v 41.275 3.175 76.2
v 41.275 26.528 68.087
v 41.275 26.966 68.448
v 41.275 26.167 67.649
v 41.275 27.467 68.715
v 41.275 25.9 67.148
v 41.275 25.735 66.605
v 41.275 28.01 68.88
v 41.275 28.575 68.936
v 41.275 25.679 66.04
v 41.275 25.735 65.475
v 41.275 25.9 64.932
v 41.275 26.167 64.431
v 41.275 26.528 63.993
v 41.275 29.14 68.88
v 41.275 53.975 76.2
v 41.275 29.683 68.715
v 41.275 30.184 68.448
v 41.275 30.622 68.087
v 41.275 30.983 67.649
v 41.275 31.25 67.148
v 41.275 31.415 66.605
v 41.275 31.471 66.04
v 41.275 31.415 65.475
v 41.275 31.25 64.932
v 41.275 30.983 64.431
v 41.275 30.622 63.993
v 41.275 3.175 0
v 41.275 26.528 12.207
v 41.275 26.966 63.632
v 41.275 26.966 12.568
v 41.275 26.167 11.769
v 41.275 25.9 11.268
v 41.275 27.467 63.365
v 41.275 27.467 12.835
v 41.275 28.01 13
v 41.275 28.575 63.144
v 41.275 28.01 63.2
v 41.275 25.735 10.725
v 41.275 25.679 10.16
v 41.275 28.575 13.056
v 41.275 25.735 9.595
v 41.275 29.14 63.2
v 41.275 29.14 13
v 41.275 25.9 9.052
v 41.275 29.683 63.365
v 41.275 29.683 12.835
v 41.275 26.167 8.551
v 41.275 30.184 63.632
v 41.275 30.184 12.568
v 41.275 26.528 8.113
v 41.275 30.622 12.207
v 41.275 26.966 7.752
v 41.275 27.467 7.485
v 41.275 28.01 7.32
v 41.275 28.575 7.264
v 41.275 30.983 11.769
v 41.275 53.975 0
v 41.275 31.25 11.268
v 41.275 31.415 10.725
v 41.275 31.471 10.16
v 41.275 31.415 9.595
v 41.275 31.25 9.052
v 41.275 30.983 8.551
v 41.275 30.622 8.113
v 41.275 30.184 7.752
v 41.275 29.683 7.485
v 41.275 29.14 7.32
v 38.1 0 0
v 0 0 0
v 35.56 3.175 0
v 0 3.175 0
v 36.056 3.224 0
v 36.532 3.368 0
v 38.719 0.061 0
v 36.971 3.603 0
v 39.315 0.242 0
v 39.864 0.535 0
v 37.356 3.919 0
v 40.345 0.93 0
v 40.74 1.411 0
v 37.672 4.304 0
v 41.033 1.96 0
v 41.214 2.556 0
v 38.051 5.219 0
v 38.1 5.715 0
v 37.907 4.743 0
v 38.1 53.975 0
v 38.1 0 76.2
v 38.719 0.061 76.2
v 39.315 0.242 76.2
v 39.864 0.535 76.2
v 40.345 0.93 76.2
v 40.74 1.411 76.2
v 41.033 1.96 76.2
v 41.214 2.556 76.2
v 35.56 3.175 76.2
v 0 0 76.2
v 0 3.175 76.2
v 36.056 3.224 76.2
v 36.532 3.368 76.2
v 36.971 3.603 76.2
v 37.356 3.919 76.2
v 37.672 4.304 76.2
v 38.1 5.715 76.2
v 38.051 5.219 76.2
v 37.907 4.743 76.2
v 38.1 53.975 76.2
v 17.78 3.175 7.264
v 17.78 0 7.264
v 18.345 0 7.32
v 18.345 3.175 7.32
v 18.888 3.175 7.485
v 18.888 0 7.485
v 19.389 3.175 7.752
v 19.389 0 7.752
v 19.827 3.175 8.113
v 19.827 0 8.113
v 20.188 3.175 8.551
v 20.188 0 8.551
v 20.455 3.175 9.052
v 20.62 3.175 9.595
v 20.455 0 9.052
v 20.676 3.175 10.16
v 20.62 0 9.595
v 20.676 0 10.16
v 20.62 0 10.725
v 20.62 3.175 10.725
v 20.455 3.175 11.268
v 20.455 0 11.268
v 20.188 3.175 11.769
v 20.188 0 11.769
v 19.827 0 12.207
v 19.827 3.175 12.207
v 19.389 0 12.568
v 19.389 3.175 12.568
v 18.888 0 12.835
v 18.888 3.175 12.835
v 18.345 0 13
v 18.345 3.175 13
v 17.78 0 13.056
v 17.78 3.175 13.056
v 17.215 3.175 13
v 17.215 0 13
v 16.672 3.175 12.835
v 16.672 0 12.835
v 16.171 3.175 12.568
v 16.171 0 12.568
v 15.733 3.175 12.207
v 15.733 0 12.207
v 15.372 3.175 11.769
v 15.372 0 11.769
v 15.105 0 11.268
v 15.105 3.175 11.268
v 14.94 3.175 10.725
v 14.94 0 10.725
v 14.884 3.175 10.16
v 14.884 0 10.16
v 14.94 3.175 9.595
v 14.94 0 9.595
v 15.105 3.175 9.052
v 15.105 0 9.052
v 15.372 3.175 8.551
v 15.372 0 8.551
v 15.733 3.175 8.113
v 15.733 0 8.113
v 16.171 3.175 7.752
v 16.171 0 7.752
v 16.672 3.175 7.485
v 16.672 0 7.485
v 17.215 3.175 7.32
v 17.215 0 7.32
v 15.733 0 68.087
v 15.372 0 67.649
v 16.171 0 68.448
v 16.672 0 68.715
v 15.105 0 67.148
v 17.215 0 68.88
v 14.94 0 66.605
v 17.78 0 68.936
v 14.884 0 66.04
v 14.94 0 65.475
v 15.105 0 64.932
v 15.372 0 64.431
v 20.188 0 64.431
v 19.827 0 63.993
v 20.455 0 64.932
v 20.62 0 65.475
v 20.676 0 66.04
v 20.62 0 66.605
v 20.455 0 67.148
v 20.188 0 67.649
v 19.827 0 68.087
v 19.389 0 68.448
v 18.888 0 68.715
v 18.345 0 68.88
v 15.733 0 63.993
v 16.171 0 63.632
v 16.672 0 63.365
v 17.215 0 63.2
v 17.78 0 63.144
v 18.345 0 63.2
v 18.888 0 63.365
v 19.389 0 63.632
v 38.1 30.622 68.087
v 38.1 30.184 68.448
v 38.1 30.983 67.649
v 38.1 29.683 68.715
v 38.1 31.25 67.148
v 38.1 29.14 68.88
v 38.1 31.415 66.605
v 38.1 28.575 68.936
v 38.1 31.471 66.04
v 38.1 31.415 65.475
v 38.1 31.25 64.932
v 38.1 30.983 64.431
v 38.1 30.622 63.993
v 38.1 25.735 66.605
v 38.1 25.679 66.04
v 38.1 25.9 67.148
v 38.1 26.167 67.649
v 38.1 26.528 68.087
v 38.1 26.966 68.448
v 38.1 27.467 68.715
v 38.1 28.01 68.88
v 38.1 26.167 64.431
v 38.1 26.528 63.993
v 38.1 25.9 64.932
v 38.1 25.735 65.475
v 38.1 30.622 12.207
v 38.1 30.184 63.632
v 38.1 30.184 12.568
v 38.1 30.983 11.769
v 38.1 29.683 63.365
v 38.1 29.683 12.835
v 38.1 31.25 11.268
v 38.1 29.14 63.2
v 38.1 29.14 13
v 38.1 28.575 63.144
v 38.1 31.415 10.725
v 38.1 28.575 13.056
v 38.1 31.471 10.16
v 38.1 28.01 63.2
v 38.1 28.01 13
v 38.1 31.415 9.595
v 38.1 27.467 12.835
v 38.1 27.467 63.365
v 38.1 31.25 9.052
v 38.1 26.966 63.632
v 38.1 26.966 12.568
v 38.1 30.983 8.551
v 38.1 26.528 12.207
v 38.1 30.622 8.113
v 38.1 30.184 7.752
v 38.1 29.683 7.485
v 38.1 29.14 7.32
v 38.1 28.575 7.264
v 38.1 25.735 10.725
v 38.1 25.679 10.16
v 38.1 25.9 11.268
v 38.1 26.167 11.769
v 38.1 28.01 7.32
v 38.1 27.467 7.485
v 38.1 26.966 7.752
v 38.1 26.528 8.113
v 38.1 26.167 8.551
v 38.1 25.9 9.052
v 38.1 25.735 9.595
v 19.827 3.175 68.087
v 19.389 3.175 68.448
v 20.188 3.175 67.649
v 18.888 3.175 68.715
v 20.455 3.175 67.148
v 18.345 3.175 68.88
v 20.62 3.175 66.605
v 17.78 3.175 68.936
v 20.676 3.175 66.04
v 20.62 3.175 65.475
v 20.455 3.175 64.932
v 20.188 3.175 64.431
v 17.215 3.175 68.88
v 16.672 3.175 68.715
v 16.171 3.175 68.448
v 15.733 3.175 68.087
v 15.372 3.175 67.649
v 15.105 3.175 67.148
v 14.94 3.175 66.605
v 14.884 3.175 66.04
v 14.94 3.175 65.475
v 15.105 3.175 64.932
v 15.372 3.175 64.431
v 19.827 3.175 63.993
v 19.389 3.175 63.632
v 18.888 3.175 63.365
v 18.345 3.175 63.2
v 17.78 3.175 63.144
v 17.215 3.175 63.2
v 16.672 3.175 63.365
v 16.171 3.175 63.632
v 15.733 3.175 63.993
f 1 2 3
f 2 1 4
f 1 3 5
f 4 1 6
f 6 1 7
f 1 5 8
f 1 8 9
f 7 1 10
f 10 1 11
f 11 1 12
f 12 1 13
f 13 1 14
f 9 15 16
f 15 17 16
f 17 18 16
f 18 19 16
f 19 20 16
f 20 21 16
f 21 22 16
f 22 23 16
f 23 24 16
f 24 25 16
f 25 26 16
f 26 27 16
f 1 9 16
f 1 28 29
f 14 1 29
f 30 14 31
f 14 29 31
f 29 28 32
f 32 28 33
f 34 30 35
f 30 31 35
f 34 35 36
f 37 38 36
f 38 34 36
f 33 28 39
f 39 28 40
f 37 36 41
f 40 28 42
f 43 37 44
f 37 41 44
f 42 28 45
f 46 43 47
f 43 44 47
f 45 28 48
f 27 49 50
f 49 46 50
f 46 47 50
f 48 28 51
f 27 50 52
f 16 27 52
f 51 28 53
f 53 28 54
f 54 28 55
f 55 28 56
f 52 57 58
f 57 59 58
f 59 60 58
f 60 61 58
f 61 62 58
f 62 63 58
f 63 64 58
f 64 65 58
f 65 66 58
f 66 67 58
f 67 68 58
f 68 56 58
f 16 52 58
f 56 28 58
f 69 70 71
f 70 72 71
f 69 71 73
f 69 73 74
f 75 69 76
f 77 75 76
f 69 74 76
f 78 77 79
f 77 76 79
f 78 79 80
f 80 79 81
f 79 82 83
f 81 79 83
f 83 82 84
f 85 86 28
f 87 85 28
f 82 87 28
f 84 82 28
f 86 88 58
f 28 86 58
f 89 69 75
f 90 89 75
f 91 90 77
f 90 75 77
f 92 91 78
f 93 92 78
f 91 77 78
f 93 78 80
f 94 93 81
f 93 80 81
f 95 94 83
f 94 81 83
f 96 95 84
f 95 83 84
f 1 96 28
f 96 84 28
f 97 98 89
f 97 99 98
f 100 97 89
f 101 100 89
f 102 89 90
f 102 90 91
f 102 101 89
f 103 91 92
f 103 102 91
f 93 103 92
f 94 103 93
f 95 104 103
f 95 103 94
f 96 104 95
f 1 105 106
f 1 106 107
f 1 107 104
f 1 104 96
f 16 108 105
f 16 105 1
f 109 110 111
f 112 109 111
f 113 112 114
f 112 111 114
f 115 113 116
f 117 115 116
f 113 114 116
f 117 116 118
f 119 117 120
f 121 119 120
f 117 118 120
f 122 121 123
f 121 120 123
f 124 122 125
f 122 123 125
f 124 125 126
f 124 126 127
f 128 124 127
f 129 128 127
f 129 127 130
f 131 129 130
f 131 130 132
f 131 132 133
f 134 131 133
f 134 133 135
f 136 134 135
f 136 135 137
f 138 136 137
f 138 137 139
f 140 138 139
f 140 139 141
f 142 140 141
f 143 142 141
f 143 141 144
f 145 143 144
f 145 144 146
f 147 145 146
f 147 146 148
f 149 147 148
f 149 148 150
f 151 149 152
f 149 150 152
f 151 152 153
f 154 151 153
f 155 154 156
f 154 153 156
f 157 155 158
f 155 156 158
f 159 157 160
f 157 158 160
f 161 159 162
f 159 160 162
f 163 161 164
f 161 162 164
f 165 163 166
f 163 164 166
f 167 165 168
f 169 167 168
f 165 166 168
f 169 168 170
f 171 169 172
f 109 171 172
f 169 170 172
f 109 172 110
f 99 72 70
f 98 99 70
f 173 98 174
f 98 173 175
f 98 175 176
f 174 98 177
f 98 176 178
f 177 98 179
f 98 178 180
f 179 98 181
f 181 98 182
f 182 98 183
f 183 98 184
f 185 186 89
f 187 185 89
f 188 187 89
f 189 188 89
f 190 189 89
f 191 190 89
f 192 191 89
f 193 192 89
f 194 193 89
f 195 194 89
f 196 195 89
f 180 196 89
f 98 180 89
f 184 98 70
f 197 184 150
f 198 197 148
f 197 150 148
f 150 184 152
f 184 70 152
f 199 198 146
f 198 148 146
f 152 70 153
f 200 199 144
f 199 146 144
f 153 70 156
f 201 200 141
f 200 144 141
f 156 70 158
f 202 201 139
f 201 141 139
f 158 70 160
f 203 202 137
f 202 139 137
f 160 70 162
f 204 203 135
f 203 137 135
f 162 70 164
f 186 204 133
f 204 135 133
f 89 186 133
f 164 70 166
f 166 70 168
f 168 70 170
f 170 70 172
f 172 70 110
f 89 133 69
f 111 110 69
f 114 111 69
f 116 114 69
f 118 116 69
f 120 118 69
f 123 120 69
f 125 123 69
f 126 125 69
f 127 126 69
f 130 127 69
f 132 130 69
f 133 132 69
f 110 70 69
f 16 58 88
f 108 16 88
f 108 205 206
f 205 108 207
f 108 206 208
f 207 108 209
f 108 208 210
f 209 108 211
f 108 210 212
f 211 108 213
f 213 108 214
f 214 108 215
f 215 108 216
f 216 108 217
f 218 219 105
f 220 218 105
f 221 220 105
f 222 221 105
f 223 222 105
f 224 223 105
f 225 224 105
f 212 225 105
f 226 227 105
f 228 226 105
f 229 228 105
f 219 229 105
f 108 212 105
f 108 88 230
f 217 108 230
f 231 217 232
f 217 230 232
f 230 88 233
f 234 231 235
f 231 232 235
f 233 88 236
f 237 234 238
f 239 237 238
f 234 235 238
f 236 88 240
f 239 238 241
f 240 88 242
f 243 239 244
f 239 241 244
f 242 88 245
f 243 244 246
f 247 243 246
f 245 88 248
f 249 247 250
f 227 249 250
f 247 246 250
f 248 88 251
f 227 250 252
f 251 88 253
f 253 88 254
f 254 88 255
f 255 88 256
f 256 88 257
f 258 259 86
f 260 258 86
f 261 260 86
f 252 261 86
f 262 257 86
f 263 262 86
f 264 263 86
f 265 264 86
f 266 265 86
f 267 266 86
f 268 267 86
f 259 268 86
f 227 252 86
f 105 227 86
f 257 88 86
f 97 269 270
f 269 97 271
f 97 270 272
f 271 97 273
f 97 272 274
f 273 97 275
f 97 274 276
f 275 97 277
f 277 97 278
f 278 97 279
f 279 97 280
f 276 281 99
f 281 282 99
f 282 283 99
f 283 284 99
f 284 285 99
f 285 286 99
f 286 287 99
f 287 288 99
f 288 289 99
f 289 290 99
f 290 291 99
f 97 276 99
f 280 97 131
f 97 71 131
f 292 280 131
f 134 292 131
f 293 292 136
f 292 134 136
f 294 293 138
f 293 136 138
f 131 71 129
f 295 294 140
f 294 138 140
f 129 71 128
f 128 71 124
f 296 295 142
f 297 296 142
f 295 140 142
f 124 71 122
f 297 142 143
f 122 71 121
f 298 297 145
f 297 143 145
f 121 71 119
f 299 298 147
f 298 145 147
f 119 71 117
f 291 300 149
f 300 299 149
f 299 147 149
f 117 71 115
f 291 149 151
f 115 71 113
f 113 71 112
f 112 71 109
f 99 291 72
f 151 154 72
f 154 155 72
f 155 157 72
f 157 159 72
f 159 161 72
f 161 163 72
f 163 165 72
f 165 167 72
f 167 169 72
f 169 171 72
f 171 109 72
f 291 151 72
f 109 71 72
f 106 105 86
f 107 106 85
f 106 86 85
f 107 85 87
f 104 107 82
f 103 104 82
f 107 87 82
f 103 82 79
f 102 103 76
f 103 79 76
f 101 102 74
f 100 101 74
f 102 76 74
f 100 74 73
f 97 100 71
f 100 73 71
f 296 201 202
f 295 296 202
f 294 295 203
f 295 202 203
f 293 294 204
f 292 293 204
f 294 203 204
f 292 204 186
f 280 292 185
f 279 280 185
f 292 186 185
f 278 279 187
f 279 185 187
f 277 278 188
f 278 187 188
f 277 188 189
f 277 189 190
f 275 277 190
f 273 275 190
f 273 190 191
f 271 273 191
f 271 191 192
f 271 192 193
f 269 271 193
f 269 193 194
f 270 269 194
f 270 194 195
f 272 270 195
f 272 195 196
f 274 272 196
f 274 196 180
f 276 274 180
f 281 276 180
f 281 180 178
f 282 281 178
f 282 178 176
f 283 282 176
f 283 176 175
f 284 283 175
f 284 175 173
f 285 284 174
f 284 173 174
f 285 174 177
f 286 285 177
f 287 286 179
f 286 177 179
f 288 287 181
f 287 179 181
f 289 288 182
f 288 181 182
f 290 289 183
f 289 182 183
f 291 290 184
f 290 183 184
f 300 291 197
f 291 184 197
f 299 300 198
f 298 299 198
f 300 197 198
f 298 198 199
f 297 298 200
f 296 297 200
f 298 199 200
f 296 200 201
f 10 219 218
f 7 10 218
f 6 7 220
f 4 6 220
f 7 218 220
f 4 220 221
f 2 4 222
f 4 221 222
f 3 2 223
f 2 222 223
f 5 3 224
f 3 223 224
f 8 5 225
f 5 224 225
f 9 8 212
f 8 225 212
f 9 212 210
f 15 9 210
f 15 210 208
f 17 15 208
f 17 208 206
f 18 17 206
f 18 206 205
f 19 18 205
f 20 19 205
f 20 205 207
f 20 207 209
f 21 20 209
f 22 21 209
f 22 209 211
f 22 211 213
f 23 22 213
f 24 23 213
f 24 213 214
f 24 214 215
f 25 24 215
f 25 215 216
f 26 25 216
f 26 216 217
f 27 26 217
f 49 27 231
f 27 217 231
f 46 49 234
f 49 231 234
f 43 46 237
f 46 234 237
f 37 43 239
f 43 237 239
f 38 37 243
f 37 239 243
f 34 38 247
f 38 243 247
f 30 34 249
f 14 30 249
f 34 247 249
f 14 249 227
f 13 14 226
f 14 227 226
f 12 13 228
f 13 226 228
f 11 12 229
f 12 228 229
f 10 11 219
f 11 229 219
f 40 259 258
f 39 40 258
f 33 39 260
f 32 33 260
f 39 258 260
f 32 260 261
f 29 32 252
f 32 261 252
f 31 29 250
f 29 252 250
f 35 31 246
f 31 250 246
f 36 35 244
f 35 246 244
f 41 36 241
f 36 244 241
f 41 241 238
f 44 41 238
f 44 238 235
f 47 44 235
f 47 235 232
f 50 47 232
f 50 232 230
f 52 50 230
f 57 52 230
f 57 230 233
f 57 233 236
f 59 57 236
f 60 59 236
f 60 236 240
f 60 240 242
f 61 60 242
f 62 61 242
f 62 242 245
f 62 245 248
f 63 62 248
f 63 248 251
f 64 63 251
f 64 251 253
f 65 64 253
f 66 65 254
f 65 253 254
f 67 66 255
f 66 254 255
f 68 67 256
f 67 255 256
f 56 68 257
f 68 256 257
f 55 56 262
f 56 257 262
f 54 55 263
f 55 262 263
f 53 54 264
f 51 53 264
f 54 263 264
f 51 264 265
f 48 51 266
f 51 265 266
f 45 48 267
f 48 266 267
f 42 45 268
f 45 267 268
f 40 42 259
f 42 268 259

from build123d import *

# Parameters (mm, degrees)
BOSS_EXTRUDE1_DEPTH                  = 76.2
F_12_CLEARANCE_HOLE1_D               = 5.7912
F_12_CLEARANCE_HOLE1_DEPTH           = 68.110147992
F_12_CLEARANCE_HOLE1_TIP             = 1.739852008
F_12_CLEARANCE_HOLE1_ON_FACE_2_D     = 5.7912
F_12_CLEARANCE_HOLE1_ON_FACE_2_DEPTH = 68.110147992
F_12_CLEARANCE_HOLE1_ON_FACE_2_TIP   = 1.739852008


with BuildPart() as part:
    # Sketch1 → Boss-Extrude1 (new body)
    with BuildSketch(Plane.XY):
        with BuildLine():
            Line((0, 0), (38.1, 0))
            ThreePointArc((38.1, 0), (40.34506403, 0.92993597), (41.275, 3.175))
            Line((41.275, 3.175), (41.275, 53.975))
            Line((41.275, 53.975), (38.1, 53.975))
            Line((38.1, 53.975), (38.1, 5.715))
            ThreePointArc((38.1, 5.715), (37.356051224, 3.918948776), (35.56, 3.175))
            Line((35.56, 3.175), (0, 3.175))
            Line((0, 3.175), (0, 0))
        make_face()
    extrude(amount=BOSS_EXTRUDE1_DEPTH)

    # #12 Clearance Hole1
    with Locations(Plane(origin=(41.275, 28.575, 10.16), x_dir=(0, 1, 0), z_dir=(1, 0, 0))):
        with Locations((0, 0), (0, 55.88)):
            Hole(F_12_CLEARANCE_HOLE1_D / 2, depth=F_12_CLEARANCE_HOLE1_DEPTH)
            with Locations((0, 0, -(F_12_CLEARANCE_HOLE1_DEPTH + F_12_CLEARANCE_HOLE1_TIP / 2))):  # 118° drill point
                Cone(0, F_12_CLEARANCE_HOLE1_D / 2, F_12_CLEARANCE_HOLE1_TIP, mode=Mode.SUBTRACT)

    # #12 Clearance Hole1 on face 2
    with Locations(Plane(origin=(17.78, 3.175, 66.04), x_dir=(0, 0, 1), z_dir=(0, 1, 0))):
        with Locations((0, 0), (-55.88, 0)):
            Hole(F_12_CLEARANCE_HOLE1_ON_FACE_2_D / 2, depth=F_12_CLEARANCE_HOLE1_ON_FACE_2_DEPTH)
            with Locations((0, 0, -(F_12_CLEARANCE_HOLE1_ON_FACE_2_DEPTH + F_12_CLEARANCE_HOLE1_ON_FACE_2_TIP / 2))):  # 118° drill point
                Cone(0, F_12_CLEARANCE_HOLE1_ON_FACE_2_D / 2, F_12_CLEARANCE_HOLE1_ON_FACE_2_TIP, mode=Mode.SUBTRACT)


solid = part.part
